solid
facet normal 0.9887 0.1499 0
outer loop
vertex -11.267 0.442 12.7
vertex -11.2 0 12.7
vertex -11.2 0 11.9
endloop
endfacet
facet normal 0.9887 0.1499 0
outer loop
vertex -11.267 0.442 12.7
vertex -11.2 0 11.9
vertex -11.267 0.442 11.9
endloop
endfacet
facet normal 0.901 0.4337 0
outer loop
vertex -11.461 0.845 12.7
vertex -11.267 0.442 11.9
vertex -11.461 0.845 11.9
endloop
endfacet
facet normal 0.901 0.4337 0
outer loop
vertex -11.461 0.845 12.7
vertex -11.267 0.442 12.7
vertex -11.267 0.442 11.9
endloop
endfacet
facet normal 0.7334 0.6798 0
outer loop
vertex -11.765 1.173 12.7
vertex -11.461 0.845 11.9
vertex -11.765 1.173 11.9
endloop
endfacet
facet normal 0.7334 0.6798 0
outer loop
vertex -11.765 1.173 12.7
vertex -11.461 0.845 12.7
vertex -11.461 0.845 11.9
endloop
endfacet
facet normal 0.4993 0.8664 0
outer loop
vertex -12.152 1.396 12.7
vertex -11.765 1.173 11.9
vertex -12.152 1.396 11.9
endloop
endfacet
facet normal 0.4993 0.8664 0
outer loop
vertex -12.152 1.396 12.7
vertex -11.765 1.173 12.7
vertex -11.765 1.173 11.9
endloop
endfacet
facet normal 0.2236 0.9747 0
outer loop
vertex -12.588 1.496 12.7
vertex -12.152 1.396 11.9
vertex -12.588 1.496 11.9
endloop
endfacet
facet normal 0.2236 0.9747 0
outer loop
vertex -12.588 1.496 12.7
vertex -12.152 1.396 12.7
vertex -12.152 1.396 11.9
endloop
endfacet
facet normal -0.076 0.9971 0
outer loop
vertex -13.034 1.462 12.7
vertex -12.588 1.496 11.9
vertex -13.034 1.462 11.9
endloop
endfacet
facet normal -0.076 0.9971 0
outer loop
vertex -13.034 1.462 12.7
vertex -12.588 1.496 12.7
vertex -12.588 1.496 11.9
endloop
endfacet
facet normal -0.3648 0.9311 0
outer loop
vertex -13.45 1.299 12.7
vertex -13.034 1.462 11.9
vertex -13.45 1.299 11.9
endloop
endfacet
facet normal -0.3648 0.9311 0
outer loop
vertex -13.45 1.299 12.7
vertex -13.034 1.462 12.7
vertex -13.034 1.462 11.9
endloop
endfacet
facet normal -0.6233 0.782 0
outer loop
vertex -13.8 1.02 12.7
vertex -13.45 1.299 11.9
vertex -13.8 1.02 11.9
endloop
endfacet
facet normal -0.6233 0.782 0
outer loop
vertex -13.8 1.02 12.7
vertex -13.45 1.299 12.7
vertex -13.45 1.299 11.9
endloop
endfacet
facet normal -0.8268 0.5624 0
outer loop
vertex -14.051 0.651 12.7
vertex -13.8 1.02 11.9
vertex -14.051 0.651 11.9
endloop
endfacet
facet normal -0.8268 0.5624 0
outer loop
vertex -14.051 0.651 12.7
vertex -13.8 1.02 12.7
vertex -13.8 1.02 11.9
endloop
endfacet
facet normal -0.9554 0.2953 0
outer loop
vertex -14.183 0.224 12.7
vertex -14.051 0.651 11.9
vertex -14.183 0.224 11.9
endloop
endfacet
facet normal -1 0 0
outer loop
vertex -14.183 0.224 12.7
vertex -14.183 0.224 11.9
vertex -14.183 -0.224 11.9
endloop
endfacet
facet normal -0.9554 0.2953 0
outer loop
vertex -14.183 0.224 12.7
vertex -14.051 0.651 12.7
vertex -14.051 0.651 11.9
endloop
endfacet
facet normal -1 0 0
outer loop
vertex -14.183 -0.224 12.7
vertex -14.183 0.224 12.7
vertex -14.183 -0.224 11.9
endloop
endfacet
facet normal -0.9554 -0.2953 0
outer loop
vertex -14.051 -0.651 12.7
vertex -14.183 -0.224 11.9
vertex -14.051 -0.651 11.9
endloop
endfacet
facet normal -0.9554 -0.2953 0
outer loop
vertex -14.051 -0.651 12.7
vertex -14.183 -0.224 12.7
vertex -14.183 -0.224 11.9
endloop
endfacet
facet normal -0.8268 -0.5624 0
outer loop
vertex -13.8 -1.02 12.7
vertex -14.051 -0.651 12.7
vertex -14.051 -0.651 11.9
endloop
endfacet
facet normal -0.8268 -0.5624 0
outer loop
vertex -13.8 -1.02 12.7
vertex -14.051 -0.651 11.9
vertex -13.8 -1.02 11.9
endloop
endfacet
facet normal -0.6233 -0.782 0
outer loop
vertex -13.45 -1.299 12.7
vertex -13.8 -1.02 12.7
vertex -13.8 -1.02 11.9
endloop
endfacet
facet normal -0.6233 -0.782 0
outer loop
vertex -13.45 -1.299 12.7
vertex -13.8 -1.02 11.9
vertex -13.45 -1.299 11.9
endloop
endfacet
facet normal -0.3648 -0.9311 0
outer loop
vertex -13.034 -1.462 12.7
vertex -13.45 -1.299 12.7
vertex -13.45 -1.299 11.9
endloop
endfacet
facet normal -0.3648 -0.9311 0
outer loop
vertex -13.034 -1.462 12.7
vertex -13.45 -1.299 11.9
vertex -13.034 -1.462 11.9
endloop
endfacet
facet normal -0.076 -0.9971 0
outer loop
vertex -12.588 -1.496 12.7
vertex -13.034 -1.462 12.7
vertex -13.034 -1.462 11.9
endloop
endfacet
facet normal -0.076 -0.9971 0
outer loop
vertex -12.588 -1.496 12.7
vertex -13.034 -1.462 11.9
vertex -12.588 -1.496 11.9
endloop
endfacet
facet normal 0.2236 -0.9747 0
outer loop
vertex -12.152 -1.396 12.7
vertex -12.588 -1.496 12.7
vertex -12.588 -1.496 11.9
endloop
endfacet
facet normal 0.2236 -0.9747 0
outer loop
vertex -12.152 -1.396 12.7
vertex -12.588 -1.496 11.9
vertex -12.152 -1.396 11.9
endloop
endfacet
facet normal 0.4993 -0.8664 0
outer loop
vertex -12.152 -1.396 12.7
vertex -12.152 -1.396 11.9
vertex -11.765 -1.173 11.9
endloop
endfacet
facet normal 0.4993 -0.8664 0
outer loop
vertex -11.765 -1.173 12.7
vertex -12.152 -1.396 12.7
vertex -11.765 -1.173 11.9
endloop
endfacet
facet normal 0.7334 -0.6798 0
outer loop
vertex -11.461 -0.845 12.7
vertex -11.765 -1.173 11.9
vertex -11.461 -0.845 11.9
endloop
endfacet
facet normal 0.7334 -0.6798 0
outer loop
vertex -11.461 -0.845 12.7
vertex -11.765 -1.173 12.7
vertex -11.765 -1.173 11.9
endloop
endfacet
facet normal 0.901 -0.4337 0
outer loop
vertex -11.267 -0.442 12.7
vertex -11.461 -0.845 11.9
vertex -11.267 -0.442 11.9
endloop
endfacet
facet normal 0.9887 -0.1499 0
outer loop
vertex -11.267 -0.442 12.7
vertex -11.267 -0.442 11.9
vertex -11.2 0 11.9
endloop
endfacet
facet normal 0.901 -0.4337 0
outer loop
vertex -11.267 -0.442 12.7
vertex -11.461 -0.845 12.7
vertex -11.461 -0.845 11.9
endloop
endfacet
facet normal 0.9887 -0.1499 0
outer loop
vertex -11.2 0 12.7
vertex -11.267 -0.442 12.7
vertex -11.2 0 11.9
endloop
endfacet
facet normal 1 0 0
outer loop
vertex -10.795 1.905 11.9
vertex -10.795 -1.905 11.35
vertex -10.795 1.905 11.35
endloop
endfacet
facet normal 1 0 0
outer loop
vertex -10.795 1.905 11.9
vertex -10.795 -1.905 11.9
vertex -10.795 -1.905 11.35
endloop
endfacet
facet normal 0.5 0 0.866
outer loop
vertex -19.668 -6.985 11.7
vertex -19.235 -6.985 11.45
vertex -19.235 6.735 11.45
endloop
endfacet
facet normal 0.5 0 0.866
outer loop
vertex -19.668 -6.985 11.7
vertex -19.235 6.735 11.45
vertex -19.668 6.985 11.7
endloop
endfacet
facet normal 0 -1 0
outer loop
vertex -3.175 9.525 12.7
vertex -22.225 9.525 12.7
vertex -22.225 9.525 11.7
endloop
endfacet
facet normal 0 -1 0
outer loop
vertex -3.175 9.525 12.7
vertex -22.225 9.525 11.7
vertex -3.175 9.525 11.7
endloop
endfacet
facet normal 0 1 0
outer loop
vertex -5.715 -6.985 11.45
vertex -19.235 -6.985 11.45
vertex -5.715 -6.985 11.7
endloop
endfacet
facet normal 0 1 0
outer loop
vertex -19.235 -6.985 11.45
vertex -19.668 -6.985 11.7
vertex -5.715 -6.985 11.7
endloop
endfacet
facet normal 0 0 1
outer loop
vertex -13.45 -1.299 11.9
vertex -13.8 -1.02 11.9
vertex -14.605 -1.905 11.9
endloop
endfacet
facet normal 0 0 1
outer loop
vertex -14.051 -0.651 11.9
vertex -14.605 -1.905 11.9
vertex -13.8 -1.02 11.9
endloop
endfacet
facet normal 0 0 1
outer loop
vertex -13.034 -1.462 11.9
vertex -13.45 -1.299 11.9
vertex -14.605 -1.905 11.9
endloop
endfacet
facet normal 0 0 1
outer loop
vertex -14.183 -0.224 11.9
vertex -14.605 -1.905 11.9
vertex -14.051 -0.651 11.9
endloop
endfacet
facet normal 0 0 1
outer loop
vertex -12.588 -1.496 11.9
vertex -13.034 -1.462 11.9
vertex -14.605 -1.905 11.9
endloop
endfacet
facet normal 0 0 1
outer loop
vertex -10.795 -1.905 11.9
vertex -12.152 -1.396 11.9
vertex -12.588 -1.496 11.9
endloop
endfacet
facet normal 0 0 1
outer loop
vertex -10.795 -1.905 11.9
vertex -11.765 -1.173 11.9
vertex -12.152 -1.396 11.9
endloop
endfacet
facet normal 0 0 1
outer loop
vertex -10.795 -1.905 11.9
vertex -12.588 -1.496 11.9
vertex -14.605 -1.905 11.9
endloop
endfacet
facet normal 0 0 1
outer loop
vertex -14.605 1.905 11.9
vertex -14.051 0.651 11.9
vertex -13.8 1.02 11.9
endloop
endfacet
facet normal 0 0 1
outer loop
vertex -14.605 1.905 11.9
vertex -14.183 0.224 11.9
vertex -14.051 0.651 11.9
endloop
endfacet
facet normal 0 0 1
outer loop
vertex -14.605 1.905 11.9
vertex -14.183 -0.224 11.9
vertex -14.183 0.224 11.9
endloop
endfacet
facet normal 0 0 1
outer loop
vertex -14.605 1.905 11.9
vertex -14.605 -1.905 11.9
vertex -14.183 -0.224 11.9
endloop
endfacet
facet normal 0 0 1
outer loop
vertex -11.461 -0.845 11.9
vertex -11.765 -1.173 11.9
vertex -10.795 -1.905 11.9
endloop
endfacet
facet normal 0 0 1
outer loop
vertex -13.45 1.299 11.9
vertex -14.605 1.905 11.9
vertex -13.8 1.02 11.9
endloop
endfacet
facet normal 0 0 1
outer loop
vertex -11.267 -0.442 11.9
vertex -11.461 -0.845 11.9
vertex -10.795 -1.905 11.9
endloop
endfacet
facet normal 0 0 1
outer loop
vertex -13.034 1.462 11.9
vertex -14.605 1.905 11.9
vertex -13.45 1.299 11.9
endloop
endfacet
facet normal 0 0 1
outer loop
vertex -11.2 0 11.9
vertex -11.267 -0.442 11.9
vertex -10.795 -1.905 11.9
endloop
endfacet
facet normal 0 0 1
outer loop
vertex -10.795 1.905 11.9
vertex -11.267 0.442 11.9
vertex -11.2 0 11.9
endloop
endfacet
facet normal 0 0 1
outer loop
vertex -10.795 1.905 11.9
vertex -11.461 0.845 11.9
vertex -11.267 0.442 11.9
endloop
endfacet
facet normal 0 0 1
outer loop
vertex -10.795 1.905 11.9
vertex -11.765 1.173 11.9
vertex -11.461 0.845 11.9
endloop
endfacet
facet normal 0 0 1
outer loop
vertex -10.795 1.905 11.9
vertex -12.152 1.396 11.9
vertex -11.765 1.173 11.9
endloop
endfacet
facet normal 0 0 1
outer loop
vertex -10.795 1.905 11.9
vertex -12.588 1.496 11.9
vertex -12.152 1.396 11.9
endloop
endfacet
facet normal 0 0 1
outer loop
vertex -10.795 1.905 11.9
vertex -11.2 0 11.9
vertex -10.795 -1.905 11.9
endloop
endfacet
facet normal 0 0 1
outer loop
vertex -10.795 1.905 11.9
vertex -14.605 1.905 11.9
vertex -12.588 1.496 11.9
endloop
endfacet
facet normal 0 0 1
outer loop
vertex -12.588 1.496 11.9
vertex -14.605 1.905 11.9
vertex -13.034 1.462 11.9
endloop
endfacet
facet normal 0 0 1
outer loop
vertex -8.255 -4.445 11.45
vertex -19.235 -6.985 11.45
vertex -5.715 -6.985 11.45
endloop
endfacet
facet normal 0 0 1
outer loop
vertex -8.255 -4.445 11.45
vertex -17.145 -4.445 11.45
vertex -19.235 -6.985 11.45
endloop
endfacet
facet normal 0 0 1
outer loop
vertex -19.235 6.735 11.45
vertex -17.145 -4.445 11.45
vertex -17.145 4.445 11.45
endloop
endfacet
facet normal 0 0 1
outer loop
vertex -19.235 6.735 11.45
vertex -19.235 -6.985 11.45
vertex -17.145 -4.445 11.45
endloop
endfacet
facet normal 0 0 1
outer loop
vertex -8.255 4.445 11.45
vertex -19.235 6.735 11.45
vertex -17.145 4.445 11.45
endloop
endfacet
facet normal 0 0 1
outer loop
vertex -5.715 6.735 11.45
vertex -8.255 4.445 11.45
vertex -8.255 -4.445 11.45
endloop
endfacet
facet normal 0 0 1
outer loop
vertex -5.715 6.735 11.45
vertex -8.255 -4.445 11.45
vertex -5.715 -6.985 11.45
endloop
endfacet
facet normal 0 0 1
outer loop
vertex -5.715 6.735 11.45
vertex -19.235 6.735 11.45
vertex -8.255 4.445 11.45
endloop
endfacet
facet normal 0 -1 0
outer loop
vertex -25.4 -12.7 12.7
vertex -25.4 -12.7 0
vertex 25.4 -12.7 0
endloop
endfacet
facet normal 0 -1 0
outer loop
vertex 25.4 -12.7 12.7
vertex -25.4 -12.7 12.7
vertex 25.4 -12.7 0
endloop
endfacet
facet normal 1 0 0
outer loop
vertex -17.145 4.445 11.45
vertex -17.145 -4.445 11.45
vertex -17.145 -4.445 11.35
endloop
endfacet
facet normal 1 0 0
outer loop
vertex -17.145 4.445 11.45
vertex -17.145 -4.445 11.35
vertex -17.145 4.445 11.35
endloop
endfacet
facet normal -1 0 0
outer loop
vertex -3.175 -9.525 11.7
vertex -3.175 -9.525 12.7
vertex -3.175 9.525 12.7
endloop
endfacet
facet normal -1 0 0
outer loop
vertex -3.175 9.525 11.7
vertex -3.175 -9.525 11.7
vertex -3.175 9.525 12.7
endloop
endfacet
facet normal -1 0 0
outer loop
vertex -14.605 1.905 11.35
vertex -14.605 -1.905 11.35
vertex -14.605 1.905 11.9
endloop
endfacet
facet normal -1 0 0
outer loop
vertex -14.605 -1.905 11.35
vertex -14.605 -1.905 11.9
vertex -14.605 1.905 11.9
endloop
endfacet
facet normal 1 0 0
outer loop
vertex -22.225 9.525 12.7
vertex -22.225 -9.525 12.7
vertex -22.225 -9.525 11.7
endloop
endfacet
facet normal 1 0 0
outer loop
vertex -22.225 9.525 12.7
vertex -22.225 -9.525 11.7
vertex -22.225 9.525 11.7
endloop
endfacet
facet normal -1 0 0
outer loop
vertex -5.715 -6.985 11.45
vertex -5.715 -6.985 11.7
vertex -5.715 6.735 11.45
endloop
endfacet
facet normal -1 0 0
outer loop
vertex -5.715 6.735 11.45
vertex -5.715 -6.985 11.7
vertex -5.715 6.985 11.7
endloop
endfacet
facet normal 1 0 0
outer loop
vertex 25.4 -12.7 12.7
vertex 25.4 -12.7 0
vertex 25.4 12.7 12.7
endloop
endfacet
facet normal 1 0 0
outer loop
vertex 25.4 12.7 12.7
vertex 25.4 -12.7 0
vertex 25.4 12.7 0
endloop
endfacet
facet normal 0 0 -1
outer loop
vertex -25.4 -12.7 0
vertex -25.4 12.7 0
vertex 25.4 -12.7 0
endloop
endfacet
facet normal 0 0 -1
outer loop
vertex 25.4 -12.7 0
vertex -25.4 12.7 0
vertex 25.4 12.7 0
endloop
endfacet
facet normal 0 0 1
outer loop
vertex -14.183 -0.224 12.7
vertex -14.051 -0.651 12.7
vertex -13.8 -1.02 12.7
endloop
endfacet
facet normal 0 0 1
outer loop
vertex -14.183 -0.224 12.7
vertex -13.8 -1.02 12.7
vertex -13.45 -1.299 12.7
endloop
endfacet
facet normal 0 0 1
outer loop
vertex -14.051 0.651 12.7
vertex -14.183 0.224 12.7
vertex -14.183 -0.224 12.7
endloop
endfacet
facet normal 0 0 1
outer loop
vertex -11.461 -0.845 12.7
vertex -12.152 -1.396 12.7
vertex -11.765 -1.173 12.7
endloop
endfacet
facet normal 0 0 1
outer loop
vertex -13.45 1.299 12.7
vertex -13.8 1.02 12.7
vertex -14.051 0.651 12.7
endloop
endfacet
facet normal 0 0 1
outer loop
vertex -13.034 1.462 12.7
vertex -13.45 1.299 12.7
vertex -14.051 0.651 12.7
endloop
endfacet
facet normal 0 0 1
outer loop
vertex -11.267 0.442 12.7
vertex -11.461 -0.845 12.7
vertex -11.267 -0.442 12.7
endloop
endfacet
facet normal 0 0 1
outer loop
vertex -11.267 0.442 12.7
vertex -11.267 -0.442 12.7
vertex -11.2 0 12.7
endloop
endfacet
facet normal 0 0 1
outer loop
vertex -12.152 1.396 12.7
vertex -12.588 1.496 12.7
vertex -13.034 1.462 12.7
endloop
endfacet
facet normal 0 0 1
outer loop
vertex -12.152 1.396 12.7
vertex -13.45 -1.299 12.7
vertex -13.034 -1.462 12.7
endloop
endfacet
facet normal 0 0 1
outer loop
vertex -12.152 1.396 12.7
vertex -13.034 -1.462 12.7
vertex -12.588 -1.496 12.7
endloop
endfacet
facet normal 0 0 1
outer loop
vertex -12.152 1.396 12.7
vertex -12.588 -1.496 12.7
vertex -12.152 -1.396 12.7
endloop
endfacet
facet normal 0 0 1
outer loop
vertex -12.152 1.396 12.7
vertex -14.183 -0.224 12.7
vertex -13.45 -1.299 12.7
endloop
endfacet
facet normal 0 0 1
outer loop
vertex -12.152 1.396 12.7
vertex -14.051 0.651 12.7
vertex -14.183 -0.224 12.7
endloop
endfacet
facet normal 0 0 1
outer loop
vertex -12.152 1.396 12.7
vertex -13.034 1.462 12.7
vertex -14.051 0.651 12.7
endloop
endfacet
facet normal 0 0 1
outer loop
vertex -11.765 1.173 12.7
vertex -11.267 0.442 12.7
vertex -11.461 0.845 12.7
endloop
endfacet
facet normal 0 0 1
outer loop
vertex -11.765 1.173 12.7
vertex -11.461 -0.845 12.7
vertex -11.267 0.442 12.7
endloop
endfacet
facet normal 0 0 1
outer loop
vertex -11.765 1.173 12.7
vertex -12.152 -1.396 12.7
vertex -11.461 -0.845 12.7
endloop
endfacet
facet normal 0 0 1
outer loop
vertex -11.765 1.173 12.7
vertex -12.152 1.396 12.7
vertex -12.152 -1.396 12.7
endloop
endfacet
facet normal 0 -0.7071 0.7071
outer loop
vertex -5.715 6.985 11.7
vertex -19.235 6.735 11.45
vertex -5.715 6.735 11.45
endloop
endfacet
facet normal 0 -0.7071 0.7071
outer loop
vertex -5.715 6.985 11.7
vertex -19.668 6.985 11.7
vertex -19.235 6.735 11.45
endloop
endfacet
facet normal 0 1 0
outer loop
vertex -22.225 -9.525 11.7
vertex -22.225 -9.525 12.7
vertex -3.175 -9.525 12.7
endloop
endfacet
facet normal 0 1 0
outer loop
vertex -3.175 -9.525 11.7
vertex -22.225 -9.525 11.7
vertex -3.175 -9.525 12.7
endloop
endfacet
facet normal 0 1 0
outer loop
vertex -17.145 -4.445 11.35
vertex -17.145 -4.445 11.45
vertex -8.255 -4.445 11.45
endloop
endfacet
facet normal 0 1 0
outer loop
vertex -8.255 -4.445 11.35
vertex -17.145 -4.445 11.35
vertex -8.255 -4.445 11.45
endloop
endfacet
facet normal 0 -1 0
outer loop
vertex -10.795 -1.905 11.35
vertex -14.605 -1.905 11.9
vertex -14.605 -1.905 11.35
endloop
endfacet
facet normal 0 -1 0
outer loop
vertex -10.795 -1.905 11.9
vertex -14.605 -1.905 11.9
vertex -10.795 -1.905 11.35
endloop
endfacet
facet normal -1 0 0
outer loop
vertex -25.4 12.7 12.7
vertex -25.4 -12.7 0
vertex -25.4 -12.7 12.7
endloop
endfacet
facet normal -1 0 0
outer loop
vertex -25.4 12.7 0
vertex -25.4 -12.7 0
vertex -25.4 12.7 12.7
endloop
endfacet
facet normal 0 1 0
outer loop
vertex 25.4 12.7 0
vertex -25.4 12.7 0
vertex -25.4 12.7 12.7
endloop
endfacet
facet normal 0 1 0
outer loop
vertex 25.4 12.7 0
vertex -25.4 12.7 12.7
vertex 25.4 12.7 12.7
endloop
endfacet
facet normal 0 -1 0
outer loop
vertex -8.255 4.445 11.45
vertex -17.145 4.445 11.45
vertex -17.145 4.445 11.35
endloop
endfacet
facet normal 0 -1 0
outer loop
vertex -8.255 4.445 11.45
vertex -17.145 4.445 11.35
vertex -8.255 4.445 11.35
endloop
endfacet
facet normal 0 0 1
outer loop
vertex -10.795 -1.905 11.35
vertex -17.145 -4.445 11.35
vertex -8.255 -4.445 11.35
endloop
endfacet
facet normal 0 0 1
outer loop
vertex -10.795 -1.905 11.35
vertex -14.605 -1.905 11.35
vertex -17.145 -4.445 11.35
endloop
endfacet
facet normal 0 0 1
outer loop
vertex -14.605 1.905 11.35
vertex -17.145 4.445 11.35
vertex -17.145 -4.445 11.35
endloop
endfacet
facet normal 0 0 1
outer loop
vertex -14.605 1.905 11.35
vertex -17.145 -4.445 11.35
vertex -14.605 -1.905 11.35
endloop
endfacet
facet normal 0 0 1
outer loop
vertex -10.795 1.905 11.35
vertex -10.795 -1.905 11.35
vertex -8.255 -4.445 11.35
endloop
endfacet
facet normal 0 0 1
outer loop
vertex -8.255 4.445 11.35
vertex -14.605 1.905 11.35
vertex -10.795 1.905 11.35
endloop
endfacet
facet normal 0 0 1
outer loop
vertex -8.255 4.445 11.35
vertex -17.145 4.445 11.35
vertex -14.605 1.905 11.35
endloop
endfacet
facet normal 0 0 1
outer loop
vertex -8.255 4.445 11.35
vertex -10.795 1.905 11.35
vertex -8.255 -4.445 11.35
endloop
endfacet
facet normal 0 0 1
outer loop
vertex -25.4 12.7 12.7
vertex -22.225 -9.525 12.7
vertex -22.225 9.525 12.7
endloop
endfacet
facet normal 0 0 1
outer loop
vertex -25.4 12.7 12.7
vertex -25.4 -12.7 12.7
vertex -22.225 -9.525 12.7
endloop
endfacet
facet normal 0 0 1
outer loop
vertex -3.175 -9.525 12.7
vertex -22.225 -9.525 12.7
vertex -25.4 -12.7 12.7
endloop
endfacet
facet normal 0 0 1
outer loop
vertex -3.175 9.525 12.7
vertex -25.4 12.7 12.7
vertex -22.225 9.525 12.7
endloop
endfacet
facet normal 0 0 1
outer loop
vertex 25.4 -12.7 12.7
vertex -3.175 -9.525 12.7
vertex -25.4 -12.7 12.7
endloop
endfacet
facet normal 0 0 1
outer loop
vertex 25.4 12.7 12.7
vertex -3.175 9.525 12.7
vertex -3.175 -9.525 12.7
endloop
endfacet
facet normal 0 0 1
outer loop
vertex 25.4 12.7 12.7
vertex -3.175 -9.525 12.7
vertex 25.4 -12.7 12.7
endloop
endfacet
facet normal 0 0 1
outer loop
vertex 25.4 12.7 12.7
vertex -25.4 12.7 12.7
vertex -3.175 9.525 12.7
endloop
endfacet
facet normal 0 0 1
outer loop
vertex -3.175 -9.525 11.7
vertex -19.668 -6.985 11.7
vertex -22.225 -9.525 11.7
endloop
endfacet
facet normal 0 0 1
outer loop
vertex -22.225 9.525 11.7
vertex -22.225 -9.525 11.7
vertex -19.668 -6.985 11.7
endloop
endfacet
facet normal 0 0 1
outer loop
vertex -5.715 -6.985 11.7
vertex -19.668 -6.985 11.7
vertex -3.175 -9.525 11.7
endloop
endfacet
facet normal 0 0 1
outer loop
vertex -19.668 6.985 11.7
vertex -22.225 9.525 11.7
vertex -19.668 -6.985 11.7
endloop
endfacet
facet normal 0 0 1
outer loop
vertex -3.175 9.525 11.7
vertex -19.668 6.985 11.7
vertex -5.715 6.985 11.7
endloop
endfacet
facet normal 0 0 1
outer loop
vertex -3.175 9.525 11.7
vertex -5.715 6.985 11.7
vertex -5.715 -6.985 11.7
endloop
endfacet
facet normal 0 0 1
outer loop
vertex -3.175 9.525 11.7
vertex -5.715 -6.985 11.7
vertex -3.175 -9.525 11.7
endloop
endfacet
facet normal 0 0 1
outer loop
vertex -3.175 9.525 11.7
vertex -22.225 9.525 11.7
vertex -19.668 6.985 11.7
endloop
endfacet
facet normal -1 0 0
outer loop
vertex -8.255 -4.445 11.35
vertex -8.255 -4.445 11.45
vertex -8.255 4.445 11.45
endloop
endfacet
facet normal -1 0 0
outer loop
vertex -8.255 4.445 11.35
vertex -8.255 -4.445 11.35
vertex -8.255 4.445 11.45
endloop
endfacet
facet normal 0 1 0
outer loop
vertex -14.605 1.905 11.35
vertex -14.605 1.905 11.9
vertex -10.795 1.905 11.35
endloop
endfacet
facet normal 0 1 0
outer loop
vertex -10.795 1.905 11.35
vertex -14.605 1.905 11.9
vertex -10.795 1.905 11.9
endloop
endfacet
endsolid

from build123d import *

# Parameters (mm, degrees)
F0_W        = 50.8
F0_H        = 25.4
F1_DEPTH    = 12.7
F2_W        = 19.05
F2_H        = 19.05
F2_W_2      = 13.97
F2_H_2      = 13.97
F2_W_3      = 8.89
F2_H_3      = 8.89
F2_W_4      = 3.81
F2_H_4      = 3.81
F3_DEPTH    = 1
F4_DEPTH    = 1.25
F5_DEPTH    = 1.35
F6_SIZE2    = 0.24999
F6_SIZE     = 0.24999
F7_T4_DEPTH = 16.0483871792
F8_W        = 3.81
F8_H        = 3.81
F8_R        = 1.5
F9_DEPTH    = 0.8


# Not quite as in the source:
# - a fillet or chamfer that OpenCascade refuses, or shapes differently, is made with other operations: its cross-section is extruded or revolved along the edge and cut away or added
# - a fillet or chamfer is up to 0.001 mm smaller than in the source, because OpenCascade refuses the exact size


with BuildPart() as f1:
    # F0 (on Top) → F1 (new body)
    with BuildSketch(Plane.XY):
        Rectangle(F0_W, F0_H)
    extrude(amount=F1_DEPTH)

    # F2 (on face) → F3 (cut)
    with BuildSketch(Plane.XY.offset(12.7)):
        with Locations((-12.7, 0)):
            Rectangle(F2_W, F2_H)
        with Locations((-12.7, 0)):
            Rectangle(F2_W_2, F2_H_2, mode=Mode.SUBTRACT)
        with Locations((-12.7, 0)):
            Rectangle(F2_W_2, F2_H_2)
        with Locations((-12.7, 0)):
            Rectangle(F2_W_3, F2_H_3, mode=Mode.SUBTRACT)
        with Locations((-12.7, 0)):
            Rectangle(F2_W_3, F2_H_3)
        with Locations((-12.7, 0)):
            Rectangle(F2_W_4, F2_H_4, mode=Mode.SUBTRACT)
    extrude(amount=-F3_DEPTH, mode=Mode.SUBTRACT)

    # F2 (on face) → F4 (cut)
    with BuildSketch(Plane.XY.offset(12.7)):
        with Locations((-12.7, 0)):
            Rectangle(F2_W_2, F2_H_2)
        with Locations((-12.7, 0)):
            Rectangle(F2_W_3, F2_H_3, mode=Mode.SUBTRACT)
    extrude(amount=-F4_DEPTH, mode=Mode.SUBTRACT)

    # F2 (on face) → F5 (cut)
    with BuildSketch(Plane.XY.offset(12.7)):
        with Locations((-12.7, 0)):
            Rectangle(F2_W_3, F2_H_3)
        with Locations((-12.7, 0)):
            Rectangle(F2_W_4, F2_H_4, mode=Mode.SUBTRACT)
    extrude(amount=-F5_DEPTH, mode=Mode.SUBTRACT)

    # F6 (size 0.25 and 0.25 in the source; OpenCascade refuses exactly that, so slightly less here)
    f6_edges = [f1.edges().sort_by_distance(p)[0] for p in [
        (-12.7, 6.985, 11.45),
    ]]
    chamfer(f6_edges, length=F6_SIZE, length2=F6_SIZE2)

    # F7: chamfer of 0.45 x 0.2598076211 on 1 edges, made by hand


with BuildPart() as f7_tool2:
    # F7_s3 → F7_t4 (new body)
    with BuildSketch(Plane.XZ.offset(-7.8991985896)):
        Polygon((-19.235, 11.45), (-19.685, 11.7098076211), (-19.685, 11.45), align=None)
    extrude(amount=F7_T4_DEPTH)

    split(bisect_by=Plane.XY.offset(11.7), keep=Keep.BOTTOM)


with BuildPart() as f1_1:
    add(f1.part)

    # F7_t1: union F7_tool2
    add(f7_tool2.part)

    # F8 (on face) → F9 (cut)
    with BuildSketch(Plane.XY.offset(12.7)):
        with Locations((-12.7, 0)):
            Rectangle(F8_W, F8_H)
        with Locations((-12.7, 0)):
            Circle(F8_R, mode=Mode.SUBTRACT)
    extrude(amount=-F9_DEPTH, mode=Mode.SUBTRACT)


solid = f1_1.part
